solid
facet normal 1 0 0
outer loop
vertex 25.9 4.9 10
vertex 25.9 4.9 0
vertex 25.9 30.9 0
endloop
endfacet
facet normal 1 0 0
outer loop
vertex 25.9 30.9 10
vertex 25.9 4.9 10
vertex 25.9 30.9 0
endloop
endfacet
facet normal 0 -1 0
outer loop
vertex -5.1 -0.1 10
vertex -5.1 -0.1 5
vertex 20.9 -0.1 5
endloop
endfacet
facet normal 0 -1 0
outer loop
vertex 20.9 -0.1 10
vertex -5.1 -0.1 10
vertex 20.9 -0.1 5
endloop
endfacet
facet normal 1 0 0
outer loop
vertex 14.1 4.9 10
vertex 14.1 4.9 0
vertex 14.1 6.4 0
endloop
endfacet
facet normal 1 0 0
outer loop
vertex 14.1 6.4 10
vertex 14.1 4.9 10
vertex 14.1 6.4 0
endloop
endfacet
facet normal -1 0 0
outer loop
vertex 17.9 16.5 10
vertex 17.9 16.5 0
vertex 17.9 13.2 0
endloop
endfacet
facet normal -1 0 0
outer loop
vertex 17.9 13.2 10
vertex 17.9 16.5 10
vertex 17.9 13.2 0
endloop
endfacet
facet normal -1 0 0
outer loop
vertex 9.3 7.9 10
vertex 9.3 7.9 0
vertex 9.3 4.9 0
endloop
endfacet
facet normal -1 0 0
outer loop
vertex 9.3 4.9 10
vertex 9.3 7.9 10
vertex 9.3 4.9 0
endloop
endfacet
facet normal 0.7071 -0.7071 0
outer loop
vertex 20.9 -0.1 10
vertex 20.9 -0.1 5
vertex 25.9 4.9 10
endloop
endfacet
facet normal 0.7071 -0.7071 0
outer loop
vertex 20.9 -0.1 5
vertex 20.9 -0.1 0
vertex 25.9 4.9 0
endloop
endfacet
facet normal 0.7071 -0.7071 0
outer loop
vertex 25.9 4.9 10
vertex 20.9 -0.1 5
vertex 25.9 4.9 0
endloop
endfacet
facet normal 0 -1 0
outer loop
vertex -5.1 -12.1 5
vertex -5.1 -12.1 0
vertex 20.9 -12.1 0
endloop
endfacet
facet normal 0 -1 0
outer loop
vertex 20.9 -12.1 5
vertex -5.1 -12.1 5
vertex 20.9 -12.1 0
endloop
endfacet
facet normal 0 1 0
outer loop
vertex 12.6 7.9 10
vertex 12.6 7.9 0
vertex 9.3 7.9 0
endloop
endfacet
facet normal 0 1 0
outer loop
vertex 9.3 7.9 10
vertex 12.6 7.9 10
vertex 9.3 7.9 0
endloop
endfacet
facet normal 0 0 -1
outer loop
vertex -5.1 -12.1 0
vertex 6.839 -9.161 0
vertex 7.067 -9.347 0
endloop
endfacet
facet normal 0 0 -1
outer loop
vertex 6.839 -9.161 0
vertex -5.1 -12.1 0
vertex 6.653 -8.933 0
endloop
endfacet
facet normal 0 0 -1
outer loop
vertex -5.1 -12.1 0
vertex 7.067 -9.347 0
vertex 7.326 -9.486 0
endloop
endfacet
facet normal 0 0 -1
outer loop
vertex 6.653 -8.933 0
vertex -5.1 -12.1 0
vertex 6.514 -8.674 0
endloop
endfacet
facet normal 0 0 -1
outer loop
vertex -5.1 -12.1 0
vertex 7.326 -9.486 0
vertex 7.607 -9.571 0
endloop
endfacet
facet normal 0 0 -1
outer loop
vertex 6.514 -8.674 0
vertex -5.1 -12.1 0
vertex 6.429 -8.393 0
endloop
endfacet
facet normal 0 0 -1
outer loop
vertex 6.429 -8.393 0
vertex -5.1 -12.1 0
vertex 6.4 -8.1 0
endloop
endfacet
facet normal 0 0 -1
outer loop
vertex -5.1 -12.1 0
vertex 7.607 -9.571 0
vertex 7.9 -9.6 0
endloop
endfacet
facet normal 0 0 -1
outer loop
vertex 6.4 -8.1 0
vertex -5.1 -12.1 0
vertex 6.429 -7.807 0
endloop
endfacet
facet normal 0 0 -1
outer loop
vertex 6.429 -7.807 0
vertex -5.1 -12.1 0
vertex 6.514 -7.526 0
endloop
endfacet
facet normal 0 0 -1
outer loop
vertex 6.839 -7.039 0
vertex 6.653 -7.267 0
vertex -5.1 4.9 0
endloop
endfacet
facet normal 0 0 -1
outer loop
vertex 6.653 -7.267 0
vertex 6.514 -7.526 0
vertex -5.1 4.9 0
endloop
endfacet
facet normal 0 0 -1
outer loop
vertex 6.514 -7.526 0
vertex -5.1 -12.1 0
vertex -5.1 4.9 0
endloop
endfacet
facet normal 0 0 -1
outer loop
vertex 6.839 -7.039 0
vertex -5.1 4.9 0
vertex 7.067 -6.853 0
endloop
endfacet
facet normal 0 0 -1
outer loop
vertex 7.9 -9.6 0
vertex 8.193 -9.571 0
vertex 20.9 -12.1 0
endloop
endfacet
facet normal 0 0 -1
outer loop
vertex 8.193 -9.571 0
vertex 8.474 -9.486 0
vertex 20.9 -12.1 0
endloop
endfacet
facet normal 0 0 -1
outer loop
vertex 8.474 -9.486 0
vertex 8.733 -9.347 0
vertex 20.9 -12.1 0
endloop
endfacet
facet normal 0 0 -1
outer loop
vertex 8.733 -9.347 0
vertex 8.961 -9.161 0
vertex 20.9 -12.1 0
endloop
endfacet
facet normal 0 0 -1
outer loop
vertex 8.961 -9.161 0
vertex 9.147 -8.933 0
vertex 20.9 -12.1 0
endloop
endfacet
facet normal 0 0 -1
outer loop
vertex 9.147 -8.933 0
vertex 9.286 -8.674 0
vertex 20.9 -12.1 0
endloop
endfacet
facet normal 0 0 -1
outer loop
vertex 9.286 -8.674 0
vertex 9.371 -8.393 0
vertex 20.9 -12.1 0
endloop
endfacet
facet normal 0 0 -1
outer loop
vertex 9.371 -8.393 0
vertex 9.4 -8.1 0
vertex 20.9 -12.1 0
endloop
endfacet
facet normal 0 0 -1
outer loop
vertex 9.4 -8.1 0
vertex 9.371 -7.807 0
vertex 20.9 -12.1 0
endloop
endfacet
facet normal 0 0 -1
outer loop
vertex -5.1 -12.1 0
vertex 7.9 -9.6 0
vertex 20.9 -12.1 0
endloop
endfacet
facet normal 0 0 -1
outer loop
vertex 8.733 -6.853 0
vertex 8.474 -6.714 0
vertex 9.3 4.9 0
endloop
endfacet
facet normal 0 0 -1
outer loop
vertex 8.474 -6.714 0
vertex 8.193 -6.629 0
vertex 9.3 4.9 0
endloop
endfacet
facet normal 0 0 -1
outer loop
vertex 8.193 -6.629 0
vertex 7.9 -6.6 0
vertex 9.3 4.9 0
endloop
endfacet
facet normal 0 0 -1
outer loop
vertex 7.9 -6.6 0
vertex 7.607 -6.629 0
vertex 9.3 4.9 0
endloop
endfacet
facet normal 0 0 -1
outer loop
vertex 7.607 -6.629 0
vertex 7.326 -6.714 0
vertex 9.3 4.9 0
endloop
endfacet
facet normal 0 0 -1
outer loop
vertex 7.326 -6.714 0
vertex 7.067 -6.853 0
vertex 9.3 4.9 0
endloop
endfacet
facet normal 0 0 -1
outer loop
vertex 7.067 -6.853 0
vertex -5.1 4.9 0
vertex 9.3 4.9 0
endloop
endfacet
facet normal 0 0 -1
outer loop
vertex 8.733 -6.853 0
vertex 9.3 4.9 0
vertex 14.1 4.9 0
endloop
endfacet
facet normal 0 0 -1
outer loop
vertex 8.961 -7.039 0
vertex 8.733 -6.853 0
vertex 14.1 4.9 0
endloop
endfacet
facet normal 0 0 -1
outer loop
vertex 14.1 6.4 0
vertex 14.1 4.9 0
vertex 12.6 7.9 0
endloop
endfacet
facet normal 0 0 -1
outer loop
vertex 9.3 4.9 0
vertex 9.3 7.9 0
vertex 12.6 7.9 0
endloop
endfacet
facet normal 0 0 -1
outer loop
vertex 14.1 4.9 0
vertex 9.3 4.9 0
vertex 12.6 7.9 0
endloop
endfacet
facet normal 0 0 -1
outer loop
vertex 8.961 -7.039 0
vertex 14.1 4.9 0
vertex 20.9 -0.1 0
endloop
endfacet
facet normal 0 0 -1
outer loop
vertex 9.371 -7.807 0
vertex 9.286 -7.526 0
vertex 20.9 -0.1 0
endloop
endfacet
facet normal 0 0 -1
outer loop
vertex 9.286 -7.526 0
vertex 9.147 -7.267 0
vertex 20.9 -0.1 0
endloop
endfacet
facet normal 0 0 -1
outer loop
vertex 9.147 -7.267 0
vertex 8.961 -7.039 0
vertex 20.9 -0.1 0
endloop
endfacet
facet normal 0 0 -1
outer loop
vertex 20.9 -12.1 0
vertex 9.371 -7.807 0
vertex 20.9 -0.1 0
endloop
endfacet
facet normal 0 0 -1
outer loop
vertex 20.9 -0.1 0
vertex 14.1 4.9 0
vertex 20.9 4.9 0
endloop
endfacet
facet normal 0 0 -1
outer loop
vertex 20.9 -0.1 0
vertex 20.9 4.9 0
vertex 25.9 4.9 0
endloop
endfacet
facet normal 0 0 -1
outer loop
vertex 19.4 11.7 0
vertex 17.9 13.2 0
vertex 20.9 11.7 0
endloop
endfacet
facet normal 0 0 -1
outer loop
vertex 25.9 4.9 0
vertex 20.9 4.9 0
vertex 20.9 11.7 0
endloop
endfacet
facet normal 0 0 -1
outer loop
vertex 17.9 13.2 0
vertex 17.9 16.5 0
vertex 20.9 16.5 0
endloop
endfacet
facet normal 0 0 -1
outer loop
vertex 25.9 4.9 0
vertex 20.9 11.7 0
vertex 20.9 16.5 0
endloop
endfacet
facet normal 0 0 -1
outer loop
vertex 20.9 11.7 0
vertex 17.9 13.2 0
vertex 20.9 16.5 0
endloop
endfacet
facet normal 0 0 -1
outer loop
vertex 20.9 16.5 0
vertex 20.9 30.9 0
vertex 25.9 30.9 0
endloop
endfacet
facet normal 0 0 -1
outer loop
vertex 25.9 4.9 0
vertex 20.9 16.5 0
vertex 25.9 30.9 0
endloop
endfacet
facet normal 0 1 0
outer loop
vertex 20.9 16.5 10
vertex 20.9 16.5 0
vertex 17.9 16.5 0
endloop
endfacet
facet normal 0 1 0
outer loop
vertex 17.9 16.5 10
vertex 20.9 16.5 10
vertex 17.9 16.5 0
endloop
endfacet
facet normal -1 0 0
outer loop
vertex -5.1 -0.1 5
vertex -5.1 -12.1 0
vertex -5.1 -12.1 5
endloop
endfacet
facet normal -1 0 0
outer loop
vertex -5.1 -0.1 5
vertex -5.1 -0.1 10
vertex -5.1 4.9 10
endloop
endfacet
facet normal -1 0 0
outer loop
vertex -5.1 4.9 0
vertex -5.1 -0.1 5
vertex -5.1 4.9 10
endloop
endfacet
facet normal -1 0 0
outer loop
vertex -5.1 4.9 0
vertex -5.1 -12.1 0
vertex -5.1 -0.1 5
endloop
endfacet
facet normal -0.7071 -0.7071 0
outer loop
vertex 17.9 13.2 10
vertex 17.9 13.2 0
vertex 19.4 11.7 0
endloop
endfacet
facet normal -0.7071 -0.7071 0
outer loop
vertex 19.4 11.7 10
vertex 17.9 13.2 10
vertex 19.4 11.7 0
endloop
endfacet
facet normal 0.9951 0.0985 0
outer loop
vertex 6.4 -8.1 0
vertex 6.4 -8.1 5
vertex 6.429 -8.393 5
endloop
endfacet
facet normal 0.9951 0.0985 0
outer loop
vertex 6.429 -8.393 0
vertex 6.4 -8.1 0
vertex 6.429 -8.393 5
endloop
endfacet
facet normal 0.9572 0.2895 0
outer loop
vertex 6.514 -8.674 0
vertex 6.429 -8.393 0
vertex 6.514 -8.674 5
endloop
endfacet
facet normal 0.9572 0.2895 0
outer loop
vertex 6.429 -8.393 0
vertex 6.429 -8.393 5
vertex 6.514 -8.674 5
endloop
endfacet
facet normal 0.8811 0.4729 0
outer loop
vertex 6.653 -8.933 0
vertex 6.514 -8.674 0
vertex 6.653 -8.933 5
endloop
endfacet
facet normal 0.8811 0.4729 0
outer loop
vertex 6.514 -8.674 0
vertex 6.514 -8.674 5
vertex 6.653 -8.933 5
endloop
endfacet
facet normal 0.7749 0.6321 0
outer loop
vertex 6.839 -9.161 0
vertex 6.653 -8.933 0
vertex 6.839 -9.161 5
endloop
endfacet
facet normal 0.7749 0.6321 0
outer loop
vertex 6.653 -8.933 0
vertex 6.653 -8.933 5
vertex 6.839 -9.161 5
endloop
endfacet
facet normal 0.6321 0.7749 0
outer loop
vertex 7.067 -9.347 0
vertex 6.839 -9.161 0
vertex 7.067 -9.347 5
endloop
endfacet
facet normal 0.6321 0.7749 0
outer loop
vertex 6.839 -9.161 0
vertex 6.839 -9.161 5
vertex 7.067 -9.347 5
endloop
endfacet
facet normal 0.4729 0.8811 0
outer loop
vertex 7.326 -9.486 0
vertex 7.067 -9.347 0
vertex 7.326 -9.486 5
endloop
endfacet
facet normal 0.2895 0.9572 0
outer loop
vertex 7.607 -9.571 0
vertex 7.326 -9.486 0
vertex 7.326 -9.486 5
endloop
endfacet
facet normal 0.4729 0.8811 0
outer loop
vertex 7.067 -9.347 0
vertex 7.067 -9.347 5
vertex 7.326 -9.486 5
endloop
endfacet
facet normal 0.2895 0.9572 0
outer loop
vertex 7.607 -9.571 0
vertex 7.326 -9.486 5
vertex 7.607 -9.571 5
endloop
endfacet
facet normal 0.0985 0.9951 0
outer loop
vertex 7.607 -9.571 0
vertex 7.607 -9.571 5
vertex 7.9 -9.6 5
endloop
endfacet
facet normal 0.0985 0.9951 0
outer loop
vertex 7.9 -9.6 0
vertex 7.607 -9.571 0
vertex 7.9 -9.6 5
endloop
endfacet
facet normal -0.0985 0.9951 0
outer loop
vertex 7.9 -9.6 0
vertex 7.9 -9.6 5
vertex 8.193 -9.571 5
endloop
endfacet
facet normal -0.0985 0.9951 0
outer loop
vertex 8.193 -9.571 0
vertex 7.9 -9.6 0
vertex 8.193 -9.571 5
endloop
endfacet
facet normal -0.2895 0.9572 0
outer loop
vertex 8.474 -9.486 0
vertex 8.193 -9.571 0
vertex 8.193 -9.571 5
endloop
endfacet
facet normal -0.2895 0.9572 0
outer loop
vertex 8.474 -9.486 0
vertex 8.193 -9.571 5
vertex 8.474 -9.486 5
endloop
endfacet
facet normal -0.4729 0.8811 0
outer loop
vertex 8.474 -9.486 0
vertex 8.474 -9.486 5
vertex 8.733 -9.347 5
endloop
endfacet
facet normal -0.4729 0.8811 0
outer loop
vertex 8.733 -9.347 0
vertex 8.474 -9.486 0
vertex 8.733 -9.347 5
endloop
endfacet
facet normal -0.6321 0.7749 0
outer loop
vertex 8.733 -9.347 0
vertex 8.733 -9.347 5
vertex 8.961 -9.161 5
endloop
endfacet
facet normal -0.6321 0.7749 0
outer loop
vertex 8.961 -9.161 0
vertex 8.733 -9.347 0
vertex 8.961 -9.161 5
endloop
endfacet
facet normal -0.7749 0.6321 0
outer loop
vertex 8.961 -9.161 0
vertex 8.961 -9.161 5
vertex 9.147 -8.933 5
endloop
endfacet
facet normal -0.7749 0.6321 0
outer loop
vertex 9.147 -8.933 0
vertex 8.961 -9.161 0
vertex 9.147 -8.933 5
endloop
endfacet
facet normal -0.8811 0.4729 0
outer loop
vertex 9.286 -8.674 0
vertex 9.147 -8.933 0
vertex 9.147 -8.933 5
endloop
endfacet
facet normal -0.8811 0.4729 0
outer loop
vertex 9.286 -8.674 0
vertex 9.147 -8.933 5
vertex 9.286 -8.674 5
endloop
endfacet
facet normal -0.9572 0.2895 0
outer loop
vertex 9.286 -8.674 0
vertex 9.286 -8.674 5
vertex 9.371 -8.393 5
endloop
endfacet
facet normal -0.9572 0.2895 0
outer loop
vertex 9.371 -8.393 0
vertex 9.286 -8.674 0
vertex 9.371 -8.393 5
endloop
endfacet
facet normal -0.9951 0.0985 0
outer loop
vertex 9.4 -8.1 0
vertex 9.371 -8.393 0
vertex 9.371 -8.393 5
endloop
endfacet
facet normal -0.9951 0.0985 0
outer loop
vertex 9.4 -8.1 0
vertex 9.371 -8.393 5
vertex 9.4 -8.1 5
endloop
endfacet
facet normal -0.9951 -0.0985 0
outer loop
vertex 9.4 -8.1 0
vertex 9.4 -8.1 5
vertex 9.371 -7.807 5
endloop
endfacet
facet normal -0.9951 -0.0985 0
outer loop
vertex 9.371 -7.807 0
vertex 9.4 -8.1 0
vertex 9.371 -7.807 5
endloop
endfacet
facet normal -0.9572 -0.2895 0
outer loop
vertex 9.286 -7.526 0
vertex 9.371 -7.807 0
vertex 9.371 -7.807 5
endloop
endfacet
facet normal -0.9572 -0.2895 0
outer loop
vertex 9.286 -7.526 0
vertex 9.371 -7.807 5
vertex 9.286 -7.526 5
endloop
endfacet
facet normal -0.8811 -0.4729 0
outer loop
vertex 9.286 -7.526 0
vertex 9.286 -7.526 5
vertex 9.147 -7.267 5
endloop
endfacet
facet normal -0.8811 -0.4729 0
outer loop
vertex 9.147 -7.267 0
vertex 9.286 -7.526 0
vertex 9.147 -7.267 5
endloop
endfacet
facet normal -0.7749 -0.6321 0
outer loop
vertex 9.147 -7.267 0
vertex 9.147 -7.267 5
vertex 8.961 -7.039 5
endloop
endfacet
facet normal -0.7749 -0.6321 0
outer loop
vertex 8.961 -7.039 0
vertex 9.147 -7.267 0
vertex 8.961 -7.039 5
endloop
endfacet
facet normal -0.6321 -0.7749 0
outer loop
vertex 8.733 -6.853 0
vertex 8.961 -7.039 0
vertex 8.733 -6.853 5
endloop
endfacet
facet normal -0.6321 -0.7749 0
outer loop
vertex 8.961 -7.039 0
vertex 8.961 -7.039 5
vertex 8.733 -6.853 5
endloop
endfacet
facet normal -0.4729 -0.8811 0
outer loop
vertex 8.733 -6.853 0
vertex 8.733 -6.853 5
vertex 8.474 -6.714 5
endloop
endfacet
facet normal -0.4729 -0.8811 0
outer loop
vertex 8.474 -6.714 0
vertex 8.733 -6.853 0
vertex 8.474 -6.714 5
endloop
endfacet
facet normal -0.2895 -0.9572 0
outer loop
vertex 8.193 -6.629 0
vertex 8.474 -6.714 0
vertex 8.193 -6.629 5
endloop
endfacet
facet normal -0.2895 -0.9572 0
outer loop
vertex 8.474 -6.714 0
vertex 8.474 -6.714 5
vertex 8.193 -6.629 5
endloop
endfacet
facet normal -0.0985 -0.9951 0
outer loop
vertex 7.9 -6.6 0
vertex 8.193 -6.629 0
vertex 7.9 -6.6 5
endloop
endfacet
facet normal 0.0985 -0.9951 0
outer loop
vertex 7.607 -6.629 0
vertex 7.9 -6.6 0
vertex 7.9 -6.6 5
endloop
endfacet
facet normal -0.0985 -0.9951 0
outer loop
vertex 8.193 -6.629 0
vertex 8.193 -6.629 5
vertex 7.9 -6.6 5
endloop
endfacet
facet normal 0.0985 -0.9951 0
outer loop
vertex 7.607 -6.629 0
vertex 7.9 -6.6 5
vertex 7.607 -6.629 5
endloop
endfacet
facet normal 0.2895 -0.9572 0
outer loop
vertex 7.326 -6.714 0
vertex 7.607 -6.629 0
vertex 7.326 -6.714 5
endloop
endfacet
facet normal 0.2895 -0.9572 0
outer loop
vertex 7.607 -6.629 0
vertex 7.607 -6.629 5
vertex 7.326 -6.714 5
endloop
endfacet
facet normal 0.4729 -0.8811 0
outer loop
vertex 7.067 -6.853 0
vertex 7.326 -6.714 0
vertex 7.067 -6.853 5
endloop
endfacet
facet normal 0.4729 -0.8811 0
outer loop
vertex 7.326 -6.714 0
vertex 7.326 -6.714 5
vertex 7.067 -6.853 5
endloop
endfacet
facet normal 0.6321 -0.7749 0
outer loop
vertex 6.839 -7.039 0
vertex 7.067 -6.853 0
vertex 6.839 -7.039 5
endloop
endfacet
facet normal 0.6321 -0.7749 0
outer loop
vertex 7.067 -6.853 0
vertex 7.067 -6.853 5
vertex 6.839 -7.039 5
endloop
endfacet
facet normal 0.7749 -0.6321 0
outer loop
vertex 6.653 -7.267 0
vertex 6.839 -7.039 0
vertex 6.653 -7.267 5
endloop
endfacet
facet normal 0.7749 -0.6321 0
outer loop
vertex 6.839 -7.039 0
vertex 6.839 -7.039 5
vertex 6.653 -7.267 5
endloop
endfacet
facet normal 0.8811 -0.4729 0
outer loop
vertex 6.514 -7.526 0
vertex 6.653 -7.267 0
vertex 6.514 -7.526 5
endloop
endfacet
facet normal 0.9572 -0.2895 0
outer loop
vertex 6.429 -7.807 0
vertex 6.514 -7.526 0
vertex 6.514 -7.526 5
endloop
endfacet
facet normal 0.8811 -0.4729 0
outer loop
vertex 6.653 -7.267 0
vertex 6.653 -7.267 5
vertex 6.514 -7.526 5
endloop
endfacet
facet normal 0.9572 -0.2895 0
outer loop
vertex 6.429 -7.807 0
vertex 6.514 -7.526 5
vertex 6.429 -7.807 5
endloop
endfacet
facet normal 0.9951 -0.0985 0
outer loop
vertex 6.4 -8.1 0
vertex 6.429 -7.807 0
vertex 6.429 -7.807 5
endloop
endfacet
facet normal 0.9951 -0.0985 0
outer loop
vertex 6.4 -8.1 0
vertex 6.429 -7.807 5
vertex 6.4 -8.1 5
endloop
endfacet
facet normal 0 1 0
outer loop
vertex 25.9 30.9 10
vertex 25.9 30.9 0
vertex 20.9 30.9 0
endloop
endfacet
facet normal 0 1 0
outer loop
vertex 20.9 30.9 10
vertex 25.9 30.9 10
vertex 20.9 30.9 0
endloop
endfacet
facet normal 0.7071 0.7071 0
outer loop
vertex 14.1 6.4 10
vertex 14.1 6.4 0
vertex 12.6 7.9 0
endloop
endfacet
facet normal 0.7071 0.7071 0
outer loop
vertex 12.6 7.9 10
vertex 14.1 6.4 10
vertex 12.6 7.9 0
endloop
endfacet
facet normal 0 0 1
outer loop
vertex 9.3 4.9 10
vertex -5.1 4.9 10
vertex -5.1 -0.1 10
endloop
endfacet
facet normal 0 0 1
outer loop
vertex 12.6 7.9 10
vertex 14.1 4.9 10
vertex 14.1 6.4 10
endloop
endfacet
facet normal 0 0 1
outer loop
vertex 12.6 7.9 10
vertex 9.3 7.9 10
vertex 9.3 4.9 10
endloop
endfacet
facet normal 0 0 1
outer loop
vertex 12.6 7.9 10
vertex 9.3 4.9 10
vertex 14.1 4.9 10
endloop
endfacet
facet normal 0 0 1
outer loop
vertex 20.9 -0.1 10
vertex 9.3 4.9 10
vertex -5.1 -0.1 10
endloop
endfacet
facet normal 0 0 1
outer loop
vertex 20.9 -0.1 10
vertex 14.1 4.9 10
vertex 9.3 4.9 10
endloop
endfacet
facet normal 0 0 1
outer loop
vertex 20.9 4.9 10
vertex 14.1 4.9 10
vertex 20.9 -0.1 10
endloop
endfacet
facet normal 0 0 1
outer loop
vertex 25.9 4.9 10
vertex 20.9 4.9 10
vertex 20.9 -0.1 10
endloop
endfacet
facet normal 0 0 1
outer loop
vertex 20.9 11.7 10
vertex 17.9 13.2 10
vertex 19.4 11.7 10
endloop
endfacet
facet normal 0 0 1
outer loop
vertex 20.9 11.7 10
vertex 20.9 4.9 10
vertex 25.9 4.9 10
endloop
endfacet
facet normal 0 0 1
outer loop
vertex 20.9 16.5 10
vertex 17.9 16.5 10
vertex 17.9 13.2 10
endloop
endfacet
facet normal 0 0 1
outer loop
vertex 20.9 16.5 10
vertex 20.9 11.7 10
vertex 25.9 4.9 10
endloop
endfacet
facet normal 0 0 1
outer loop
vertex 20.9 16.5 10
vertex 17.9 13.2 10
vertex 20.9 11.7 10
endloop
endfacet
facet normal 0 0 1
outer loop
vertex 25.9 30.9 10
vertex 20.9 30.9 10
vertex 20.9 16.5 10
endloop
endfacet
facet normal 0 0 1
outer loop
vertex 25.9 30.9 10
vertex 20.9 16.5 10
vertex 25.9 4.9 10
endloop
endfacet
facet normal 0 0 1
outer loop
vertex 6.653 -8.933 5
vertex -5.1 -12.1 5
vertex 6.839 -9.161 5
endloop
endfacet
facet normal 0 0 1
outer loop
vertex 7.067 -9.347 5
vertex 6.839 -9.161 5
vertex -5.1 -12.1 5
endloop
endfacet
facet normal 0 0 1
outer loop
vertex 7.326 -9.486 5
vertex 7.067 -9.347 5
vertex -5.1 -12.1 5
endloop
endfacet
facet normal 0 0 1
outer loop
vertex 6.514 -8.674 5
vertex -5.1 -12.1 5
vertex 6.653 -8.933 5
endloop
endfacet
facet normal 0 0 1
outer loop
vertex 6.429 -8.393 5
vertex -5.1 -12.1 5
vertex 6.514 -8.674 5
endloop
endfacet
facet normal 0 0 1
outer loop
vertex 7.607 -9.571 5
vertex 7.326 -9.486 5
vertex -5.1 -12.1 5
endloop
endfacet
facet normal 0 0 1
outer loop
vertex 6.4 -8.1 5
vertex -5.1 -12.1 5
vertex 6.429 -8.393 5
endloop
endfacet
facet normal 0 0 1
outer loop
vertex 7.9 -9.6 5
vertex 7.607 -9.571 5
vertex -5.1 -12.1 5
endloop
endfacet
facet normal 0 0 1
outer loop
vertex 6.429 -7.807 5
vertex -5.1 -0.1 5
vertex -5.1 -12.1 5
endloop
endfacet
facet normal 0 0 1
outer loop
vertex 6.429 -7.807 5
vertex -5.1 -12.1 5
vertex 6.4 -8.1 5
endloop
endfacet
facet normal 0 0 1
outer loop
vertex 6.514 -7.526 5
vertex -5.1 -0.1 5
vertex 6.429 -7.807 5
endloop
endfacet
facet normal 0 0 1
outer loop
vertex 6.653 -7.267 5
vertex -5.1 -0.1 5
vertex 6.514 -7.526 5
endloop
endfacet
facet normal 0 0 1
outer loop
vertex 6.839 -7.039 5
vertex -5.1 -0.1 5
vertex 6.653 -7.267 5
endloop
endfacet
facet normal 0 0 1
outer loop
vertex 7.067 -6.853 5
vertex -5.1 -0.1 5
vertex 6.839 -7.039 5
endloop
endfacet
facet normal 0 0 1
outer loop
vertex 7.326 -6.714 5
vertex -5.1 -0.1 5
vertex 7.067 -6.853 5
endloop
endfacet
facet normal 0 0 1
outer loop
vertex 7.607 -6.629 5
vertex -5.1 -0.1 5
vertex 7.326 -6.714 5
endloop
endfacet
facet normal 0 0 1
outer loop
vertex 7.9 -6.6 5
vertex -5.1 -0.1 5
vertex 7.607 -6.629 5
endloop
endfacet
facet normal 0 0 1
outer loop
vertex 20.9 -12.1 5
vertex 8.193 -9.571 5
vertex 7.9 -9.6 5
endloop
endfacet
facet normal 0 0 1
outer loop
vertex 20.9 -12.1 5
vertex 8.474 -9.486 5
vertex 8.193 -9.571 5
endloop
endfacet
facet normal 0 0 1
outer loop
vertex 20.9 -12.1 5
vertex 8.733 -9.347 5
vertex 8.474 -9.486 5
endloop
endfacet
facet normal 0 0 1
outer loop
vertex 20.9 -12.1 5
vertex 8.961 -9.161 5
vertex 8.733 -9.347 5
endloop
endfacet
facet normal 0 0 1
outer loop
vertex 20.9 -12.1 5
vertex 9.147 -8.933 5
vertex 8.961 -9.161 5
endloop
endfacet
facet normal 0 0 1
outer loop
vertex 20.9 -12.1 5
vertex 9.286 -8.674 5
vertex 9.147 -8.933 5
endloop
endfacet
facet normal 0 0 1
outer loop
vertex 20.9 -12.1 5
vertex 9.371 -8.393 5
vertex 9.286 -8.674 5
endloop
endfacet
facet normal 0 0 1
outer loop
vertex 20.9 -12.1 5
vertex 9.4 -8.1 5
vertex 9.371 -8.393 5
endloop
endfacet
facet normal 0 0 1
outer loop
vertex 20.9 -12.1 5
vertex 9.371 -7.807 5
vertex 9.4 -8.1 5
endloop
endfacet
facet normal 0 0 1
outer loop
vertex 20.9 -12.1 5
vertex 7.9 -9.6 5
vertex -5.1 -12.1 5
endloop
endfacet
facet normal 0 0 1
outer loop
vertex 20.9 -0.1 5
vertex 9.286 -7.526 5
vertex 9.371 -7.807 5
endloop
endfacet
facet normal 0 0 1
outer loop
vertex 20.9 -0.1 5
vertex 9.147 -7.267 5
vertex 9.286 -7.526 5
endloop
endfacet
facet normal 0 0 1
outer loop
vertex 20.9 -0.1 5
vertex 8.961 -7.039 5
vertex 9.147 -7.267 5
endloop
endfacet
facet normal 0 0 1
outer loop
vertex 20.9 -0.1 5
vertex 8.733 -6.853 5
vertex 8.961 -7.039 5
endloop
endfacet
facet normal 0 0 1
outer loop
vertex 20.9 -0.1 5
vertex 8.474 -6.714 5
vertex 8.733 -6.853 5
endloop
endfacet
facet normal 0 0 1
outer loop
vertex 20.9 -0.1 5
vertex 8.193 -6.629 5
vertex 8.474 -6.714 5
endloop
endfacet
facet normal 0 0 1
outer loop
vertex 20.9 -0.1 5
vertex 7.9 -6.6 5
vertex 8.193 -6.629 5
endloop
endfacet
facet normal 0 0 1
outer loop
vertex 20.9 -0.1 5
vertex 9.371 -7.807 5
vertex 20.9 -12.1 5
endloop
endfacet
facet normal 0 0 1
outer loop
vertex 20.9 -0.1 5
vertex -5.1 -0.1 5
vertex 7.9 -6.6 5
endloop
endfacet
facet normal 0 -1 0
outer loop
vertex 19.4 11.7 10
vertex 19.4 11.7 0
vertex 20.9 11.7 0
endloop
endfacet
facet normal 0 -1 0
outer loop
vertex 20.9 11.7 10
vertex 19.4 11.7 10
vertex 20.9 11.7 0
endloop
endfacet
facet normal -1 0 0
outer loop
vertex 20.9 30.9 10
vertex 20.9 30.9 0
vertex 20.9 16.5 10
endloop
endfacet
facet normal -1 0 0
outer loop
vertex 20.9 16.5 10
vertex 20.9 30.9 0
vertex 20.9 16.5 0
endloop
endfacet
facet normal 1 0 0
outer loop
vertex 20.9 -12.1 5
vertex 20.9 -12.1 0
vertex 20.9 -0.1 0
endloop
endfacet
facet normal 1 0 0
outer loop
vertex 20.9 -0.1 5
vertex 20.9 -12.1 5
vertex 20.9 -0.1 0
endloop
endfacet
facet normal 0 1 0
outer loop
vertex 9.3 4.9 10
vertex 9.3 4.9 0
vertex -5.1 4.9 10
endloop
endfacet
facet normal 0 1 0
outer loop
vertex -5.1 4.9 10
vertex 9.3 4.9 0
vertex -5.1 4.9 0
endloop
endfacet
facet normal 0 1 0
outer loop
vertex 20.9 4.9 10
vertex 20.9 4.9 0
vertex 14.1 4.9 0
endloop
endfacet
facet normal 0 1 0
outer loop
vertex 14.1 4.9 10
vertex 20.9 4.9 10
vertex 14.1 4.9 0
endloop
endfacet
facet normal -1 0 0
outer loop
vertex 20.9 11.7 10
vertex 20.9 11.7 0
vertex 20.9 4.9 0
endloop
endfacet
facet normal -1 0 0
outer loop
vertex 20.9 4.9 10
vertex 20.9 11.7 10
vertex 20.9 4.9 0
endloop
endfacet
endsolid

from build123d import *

# Parameters (mm, degrees)
F2_DEPTH = 10
F1_W     = 26
F1_H     = 12
F3_DEPTH = 5
F4_D     = 3


with BuildPart() as f2:
    # F1 (on Top) → F2 (new body)
    with BuildSketch(Plane.XY):
        Polygon((20.9, 30.9), (20.9, 16.5), (17.9, 16.5), (17.9, 13.2), (19.4, 11.7), (20.9, 11.7), (20.9, 4.9), (14.1, 4.9), (14.1, 6.4), (12.6, 7.9), (9.3, 7.9), (9.3, 4.9), (-5.1, 4.9), (-5.1, -0.1), (20.9, -0.1), (25.9, 4.9), (25.9, 30.9), align=None)
    extrude(amount=F2_DEPTH)

    # F1 (on Top) → F3 (join)
    with BuildSketch(Plane.XY):
        with Locations((7.9, -6.1)):
            Rectangle(F1_W, F1_H)
    extrude(amount=F3_DEPTH)

    # F4 (through all)
    with Locations(Plane(origin=(0, 0, 0), x_dir=(1, 0, 0), z_dir=(0, 0, -1))):
        with Locations((7.8999996185, 8.1)):
            Hole(F4_D / 2)


solid = f2.part
